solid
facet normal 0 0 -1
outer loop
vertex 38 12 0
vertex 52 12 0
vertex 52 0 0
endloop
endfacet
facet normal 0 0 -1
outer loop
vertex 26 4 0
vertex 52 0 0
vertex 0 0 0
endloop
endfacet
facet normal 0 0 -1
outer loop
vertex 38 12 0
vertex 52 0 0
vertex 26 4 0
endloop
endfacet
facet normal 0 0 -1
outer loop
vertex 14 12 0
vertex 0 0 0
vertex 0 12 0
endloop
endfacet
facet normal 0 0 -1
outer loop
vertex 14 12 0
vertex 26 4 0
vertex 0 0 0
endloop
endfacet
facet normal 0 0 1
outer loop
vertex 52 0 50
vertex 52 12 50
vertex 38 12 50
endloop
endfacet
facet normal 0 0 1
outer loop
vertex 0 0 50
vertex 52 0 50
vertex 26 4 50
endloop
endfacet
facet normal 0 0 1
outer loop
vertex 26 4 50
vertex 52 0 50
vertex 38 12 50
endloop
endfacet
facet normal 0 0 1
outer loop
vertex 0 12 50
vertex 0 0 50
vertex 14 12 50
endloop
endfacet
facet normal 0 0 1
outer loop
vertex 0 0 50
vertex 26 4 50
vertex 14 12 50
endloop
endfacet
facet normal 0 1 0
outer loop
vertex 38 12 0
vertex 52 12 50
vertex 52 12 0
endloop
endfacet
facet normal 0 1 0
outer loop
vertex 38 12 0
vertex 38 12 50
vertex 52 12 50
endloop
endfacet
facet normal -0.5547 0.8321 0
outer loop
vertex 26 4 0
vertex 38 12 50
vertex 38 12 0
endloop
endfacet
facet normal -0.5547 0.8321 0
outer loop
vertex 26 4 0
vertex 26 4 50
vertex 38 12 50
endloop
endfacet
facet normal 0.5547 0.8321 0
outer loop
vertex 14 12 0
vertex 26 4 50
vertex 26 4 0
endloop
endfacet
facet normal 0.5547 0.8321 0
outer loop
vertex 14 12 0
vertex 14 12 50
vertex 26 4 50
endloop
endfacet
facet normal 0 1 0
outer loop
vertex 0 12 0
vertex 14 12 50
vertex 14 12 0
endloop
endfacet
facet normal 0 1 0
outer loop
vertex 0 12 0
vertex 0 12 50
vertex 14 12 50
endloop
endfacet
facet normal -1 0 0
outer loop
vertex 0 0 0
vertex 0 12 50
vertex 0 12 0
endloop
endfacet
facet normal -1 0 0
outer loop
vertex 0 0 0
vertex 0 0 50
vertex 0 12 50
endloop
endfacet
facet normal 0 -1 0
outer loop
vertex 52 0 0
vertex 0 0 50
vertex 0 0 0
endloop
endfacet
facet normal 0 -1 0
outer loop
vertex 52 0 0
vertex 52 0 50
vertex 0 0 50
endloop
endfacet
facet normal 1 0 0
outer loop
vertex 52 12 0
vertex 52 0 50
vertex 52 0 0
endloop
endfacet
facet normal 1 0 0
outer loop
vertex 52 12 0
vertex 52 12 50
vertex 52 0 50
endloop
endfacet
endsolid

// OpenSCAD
$fn = 32;

// ----------------------------------------------------------------------
// V guide rail: vway, 52 mm wide
// ----------------------------------------------------------------------

// --- parameters (mm) ---
rail_w = 52;              // rail width, X
base_t = 12;              // base plate thickness
v_depth = 8;              // V feature depth / height
v_half_w = 12;            // half width of the V at the base face
plate_t = 50;             // rail length, Z (the extrusion height)

profile = [[0, 0], [52, 0], [52, 12], [38, 12], [26, 4], [14, 12], [0, 12]];  // primary outline, 7 points, counter clockwise

// --- the one profile operation ---
linear_extrude(height = plate_t) polygon(points = profile);
